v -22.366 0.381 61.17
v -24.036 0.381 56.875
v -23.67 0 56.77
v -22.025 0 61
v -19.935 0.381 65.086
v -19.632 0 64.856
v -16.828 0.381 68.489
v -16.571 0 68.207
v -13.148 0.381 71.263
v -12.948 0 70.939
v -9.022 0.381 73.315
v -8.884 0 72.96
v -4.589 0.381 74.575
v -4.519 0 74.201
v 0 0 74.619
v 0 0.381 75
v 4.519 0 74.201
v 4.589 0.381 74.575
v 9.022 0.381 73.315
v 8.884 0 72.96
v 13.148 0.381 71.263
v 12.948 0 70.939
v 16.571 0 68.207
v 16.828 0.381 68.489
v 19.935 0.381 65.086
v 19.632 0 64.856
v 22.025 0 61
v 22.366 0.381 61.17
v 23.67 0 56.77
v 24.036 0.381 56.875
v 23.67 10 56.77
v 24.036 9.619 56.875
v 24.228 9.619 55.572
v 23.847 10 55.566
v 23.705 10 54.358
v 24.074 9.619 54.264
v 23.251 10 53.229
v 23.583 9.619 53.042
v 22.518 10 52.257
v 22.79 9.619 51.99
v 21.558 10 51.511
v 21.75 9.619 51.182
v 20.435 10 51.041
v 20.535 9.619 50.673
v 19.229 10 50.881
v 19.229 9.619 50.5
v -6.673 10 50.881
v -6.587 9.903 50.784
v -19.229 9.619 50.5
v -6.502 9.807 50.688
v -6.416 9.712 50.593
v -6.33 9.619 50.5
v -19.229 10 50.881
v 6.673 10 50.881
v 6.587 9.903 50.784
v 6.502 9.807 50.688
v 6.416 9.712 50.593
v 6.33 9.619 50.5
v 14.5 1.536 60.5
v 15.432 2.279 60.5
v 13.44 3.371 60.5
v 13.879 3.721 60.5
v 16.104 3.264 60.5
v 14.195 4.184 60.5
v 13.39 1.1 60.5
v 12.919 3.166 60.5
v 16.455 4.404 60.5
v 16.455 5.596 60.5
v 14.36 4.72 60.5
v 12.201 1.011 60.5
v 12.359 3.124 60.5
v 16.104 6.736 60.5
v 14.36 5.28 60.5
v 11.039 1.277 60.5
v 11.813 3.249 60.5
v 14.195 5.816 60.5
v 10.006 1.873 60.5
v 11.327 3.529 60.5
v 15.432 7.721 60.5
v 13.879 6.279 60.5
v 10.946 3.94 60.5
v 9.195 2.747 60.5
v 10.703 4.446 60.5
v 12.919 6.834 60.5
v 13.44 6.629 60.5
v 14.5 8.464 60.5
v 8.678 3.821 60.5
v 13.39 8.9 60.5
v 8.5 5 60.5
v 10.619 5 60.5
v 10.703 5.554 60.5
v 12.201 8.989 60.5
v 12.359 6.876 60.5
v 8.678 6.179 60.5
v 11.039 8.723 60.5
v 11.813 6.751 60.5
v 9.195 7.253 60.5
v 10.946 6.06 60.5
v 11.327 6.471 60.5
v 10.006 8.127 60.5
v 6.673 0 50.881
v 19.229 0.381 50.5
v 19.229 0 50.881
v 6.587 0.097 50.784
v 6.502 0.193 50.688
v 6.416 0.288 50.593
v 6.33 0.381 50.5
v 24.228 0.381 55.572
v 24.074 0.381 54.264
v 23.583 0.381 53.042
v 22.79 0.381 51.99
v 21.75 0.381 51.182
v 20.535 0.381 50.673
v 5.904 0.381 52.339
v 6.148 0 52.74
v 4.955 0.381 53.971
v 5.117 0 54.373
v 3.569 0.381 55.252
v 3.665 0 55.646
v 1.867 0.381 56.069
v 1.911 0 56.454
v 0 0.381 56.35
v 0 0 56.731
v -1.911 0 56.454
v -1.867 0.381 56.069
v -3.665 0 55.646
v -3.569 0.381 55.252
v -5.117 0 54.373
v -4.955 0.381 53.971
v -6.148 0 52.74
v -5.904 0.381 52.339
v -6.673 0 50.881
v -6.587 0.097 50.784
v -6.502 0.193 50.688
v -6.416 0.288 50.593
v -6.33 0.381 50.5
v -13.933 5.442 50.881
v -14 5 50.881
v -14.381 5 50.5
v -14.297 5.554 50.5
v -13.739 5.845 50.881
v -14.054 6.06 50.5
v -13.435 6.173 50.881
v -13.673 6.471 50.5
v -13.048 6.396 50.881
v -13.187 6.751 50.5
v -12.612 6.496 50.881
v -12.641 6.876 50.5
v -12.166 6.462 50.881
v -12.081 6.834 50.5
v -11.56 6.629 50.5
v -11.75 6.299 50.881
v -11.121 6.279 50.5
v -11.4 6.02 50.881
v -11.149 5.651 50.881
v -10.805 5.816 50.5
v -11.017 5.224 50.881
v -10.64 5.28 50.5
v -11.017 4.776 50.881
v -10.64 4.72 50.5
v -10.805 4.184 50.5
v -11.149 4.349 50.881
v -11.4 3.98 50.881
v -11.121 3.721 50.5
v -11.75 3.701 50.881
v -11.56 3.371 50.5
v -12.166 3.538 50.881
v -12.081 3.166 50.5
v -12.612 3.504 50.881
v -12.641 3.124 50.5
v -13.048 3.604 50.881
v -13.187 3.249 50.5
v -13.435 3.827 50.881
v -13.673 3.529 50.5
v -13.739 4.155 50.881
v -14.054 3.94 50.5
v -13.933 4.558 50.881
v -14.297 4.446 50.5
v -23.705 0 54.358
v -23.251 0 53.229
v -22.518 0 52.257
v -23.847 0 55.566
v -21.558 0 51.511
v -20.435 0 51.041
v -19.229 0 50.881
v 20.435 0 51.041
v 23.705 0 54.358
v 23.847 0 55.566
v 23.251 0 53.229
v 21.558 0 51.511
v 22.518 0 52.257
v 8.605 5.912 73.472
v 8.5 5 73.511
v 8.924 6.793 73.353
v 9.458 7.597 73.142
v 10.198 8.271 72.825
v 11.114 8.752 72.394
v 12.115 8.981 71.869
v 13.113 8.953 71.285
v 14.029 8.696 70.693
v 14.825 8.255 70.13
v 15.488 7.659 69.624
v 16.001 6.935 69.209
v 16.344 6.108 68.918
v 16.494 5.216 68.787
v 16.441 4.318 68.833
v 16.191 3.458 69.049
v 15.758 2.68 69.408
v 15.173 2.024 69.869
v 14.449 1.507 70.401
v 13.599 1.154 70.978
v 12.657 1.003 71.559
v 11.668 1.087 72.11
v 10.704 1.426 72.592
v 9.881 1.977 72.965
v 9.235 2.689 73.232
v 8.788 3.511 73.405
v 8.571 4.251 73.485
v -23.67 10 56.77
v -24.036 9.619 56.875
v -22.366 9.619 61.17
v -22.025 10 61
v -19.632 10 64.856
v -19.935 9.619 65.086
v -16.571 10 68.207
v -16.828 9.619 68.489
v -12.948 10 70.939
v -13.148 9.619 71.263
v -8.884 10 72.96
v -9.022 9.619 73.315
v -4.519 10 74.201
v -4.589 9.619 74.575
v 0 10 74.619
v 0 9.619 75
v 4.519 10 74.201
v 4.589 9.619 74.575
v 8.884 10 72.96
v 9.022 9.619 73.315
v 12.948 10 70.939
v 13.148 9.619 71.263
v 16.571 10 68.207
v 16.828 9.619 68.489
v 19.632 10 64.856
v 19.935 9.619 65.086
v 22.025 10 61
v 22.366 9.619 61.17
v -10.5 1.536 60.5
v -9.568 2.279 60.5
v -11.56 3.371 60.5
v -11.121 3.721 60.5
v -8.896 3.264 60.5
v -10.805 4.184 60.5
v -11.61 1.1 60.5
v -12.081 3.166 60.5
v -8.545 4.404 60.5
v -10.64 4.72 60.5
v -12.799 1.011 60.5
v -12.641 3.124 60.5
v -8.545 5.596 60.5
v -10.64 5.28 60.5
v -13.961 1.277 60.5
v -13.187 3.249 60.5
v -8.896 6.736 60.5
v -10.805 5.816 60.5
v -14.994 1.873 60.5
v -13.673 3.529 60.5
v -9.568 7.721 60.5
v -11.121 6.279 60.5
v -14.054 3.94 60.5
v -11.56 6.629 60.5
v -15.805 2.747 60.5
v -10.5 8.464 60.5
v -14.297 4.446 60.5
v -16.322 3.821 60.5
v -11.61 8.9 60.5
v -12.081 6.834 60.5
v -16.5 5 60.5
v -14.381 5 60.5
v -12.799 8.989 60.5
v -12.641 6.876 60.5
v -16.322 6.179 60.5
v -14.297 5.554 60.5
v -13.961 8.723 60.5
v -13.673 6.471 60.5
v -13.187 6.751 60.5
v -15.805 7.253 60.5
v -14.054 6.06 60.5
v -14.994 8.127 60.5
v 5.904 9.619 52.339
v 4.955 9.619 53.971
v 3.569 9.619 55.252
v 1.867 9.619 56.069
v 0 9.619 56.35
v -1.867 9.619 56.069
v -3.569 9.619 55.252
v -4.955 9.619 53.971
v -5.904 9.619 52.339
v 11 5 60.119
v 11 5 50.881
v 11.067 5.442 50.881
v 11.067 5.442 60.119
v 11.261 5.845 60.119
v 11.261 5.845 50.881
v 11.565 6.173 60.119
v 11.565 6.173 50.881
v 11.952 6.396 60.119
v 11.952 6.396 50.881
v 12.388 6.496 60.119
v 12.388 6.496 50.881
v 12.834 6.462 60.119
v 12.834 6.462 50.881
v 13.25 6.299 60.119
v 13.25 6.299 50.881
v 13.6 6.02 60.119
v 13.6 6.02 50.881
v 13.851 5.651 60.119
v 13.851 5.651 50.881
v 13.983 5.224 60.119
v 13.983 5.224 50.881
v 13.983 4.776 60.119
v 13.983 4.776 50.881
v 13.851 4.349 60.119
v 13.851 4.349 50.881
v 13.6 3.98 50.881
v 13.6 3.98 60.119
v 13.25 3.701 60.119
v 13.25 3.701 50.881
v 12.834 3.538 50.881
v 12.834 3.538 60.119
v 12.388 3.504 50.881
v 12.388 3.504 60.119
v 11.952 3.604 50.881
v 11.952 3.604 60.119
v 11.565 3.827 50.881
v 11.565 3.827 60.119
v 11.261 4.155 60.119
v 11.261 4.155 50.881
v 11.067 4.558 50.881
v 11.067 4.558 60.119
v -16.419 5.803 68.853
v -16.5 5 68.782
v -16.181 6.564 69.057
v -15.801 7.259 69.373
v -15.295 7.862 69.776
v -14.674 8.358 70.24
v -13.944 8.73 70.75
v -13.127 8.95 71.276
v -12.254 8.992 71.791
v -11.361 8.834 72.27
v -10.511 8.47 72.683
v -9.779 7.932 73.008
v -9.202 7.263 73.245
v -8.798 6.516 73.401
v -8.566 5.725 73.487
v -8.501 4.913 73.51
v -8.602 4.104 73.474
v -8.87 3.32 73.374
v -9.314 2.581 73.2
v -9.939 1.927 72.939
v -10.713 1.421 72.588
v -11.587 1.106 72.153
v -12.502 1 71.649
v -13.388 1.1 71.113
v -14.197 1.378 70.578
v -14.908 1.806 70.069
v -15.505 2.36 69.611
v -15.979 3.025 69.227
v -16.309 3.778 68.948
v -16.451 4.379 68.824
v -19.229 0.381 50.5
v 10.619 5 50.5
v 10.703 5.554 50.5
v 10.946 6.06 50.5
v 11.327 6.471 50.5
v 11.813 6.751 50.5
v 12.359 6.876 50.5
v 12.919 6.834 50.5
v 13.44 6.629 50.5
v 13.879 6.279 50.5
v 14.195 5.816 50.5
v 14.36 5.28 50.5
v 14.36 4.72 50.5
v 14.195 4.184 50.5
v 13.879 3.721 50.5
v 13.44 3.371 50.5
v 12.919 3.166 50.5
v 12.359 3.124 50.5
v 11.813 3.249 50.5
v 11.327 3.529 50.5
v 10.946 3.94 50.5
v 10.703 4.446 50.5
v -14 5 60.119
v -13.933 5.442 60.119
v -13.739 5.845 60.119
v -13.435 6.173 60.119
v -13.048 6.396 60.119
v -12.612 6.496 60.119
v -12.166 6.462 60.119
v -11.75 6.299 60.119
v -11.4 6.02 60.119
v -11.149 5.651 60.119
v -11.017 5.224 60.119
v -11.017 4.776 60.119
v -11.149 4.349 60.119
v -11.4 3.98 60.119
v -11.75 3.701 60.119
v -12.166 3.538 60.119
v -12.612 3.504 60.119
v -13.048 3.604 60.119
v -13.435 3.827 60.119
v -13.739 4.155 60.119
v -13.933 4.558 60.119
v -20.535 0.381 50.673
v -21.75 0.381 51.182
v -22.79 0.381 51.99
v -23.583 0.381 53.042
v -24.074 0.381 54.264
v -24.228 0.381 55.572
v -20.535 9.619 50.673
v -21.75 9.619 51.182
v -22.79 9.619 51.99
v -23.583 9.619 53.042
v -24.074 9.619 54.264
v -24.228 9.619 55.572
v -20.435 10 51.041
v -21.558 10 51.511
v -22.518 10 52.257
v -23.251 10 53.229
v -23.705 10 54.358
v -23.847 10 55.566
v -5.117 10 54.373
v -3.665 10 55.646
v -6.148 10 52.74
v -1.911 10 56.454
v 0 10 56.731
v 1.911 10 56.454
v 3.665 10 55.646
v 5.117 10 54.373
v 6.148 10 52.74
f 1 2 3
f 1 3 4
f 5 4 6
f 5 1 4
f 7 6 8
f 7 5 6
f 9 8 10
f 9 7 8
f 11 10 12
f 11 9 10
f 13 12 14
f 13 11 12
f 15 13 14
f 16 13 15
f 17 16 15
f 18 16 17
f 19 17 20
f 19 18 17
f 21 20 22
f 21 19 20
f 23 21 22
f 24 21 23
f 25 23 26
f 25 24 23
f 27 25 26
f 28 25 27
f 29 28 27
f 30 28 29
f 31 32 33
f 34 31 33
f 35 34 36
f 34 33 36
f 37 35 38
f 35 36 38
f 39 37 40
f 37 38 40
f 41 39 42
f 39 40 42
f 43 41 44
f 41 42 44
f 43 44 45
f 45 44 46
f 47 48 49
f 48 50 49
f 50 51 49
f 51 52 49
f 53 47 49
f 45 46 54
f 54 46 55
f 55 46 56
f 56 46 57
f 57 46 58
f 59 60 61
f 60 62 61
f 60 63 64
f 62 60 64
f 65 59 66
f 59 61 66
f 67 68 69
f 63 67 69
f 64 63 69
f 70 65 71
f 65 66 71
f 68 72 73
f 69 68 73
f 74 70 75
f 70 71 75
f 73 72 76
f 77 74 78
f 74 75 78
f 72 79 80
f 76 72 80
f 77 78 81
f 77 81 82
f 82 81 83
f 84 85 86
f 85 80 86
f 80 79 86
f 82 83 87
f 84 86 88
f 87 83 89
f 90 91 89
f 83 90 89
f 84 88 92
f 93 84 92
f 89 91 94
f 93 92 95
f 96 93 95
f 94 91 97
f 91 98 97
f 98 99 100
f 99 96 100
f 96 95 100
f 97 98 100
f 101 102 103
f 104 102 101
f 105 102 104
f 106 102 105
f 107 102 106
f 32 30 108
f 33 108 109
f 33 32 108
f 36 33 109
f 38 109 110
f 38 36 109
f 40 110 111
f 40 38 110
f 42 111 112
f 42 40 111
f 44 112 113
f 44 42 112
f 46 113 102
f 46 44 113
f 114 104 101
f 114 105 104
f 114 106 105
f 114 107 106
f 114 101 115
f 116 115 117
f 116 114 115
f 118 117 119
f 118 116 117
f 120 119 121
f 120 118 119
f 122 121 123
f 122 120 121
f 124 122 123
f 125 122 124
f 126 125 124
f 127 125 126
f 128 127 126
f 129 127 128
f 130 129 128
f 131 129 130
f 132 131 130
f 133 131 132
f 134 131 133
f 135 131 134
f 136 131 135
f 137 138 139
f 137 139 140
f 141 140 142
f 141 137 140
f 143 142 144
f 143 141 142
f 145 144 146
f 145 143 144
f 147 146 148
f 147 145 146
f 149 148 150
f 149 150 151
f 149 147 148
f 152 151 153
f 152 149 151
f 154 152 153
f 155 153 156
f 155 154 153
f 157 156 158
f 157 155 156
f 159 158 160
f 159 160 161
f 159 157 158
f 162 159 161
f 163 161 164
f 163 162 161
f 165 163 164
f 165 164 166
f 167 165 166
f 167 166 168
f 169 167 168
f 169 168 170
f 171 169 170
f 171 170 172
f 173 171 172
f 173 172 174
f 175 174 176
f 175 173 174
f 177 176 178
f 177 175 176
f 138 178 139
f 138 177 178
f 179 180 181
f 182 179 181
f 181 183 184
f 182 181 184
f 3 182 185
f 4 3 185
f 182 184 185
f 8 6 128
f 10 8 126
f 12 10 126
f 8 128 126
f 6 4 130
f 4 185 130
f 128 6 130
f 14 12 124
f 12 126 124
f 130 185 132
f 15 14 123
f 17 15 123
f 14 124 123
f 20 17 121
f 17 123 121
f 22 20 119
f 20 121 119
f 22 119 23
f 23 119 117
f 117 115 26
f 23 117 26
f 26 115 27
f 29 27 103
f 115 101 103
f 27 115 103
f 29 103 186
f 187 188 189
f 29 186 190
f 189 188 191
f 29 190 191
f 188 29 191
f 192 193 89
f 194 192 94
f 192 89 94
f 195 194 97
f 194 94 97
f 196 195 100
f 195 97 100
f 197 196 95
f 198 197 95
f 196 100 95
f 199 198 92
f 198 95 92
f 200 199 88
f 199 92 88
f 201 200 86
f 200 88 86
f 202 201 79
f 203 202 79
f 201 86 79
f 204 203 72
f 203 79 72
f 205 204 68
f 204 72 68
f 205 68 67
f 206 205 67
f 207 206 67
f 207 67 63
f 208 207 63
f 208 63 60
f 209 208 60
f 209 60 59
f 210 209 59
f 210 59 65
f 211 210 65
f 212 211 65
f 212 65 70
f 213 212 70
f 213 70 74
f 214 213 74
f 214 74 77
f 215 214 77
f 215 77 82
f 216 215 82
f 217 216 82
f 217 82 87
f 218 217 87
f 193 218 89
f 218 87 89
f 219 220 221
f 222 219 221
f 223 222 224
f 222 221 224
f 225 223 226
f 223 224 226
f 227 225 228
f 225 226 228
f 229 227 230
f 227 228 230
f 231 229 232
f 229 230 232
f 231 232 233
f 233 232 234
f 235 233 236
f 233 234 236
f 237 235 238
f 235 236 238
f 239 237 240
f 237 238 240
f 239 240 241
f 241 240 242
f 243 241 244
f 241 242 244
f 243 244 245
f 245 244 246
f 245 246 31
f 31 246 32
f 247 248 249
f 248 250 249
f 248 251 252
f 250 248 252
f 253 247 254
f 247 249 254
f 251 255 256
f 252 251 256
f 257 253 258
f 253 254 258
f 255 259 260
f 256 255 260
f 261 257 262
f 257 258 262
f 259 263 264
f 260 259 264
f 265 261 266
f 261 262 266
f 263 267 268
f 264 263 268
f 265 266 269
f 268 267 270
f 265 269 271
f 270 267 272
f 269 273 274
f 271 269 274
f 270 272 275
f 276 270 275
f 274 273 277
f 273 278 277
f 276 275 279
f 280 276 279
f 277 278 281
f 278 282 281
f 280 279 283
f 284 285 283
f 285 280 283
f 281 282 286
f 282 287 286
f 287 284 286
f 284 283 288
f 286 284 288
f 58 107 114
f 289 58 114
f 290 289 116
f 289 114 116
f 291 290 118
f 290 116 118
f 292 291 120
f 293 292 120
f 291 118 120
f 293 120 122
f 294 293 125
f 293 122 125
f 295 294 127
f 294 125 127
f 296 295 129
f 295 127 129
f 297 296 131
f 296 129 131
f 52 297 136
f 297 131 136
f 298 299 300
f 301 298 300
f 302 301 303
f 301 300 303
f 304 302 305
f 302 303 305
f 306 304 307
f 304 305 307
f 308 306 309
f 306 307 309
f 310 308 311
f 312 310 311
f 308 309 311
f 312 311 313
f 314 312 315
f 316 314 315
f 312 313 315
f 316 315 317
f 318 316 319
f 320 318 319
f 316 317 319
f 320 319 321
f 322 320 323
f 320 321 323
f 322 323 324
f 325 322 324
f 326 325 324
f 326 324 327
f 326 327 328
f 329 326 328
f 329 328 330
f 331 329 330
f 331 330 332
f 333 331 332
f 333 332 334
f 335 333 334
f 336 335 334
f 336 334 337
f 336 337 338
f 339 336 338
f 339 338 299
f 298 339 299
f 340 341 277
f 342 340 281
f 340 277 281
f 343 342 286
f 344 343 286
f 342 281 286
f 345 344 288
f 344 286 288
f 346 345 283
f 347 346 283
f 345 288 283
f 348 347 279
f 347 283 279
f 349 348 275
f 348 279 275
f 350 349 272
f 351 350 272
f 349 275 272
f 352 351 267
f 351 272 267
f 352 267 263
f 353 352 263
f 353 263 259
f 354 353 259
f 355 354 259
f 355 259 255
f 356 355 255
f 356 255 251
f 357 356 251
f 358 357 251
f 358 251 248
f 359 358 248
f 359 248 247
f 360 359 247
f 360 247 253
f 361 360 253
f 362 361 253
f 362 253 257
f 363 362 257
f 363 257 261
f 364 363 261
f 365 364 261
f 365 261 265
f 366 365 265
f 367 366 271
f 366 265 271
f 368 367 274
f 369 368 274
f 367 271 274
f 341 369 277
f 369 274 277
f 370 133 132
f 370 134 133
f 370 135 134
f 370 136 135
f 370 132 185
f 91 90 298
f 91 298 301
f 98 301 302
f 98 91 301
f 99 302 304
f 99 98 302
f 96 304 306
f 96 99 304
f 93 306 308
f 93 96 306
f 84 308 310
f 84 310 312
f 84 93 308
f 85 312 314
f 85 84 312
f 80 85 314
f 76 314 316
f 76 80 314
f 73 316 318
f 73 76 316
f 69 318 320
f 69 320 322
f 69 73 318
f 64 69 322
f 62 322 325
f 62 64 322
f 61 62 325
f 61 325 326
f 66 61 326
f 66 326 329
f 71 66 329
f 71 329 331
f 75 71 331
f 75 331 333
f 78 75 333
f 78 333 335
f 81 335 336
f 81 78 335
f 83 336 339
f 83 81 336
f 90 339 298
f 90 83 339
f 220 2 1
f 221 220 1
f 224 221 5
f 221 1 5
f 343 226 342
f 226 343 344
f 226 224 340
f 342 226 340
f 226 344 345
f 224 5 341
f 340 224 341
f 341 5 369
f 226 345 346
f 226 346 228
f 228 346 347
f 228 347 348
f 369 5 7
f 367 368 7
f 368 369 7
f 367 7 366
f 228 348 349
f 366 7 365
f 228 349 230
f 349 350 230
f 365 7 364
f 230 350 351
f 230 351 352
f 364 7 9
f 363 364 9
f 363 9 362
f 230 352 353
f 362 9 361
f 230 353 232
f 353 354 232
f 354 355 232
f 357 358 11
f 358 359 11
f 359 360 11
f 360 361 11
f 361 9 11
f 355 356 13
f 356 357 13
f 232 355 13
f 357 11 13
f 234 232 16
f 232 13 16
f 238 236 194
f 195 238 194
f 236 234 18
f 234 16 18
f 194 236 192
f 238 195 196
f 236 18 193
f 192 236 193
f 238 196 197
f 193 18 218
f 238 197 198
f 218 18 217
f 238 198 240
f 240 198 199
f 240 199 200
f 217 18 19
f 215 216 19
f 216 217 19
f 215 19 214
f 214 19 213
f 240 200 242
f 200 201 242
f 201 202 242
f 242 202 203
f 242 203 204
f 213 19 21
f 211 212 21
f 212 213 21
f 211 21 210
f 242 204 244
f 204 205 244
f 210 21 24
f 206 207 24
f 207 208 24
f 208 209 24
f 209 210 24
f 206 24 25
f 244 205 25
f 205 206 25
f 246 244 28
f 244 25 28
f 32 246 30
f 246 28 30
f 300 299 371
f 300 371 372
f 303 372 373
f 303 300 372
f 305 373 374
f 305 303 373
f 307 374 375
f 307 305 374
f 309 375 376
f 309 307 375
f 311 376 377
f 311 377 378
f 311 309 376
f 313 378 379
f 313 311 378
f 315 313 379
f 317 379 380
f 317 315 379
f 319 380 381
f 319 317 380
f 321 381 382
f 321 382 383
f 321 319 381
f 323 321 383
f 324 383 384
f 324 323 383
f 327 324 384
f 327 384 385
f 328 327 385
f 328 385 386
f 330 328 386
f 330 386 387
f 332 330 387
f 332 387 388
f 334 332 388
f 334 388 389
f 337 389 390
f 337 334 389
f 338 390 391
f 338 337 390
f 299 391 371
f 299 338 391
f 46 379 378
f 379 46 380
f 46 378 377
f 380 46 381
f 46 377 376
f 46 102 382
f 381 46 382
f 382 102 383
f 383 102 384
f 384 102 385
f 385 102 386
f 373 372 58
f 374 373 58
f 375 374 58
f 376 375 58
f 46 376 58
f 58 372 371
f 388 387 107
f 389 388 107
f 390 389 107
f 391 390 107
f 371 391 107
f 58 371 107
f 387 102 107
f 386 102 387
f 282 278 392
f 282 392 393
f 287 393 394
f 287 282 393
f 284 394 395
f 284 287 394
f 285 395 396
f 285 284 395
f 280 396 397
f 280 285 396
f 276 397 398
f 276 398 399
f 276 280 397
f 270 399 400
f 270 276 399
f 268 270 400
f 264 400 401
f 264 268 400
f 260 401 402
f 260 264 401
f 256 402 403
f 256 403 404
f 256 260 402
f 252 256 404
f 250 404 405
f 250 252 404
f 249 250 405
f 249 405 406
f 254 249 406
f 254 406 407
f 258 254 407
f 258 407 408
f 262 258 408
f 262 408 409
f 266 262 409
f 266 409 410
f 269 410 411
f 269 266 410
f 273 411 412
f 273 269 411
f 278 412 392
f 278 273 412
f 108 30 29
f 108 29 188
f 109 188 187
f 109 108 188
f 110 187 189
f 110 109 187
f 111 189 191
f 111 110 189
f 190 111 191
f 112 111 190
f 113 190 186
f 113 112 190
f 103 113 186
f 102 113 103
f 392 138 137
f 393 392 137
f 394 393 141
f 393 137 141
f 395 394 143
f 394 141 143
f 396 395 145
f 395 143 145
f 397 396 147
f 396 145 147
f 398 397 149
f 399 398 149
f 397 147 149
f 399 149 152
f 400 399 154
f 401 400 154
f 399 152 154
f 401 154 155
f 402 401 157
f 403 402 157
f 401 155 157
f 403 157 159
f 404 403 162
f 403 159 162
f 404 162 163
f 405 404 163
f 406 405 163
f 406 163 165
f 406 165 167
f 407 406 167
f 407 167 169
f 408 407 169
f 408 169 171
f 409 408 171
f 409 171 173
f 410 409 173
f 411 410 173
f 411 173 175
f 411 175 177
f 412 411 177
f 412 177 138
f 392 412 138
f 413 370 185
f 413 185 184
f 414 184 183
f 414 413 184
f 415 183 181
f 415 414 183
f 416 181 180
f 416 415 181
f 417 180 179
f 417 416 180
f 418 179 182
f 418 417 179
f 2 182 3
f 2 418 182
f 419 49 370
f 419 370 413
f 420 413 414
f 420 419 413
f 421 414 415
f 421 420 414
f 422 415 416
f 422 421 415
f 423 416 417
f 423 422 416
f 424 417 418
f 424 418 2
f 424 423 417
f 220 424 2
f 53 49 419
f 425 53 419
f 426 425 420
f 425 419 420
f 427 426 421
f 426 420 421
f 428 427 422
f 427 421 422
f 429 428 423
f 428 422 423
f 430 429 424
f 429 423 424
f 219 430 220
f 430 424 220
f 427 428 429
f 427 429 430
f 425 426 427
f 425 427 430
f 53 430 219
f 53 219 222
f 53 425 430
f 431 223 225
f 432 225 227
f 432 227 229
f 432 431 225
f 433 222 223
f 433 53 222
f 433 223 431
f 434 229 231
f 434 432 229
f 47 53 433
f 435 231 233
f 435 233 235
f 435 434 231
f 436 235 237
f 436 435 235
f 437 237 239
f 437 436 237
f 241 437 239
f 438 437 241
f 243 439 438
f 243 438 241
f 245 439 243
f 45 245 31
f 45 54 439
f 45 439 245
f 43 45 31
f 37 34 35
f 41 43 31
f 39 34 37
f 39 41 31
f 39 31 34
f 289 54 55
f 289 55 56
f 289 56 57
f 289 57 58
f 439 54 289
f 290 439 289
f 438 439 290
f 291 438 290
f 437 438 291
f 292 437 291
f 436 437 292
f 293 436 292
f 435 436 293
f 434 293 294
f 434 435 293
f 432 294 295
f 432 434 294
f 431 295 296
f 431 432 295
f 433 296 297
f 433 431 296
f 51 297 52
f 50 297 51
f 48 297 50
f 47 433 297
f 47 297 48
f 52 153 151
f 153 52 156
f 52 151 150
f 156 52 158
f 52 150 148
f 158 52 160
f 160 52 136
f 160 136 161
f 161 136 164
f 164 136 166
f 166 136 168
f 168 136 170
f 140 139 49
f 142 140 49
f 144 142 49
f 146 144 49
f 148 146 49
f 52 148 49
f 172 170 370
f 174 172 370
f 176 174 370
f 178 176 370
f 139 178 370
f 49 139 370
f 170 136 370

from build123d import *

# Parameters (mm, degrees)
BOSS_EXTRUDE1_DEPTH = 10
FILLET1_R           = 5
SKETCH2_R           = 1.5
CUT_EXTRUDE1_DEPTH  = 36.878807745
CUT_EXTRUDE2_START  = -10
SKETCH2_3_R         = 4
SKETCH2_3_R_2       = 1.5
CUT_EXTRUDE2_DEPTH  = 26.878807842
CHAMFER1_SIZE       = 0.381


with BuildPart() as part:
    # Sketch1 → Boss-Extrude1 (new body)
    with BuildSketch(Plane(origin=(0, 0, 0), x_dir=(1, 0, 0), z_dir=(0, 1, 0))):
        with BuildLine():
            Line((-6.330284354, -50.5), (-24.9949995, -50.5))
            ThreePointArc((-24.9949995, -50.5), (0, -75), (24.9949995, -50.5))
            Line((24.9949995, -50.5), (6.330284354, -50.5))
            ThreePointArc((6.330284354, -50.5), (0, -56.35), (-6.330284354, -50.5))
        make_face()
    extrude(amount=BOSS_EXTRUDE1_DEPTH)

    # Fillet1
    fillet1_edges = [part.edges().sort_by_distance(p)[0] for p in [
        (24.9949995, 5, 50.5),
        (-24.9949995, 5, 50.5),
    ]]
    fillet(fillet1_edges, radius=FILLET1_R)

    # Sketch2 → Cut-Extrude1 (cut, through all)
    with BuildSketch(Plane(origin=(0, 0, 50.5), x_dir=(-1, 0, 0), z_dir=(0, 0, -1))):
        with Locations((-12.5, 5)):
            Circle(SKETCH2_R)
        with Locations((12.5, 5)):
            Circle(SKETCH2_R)
    extrude(amount=-CUT_EXTRUDE1_DEPTH, mode=Mode.SUBTRACT)

    # Sketch2<3> → Cut-Extrude2 (cut, through all)
    # profile 1 of 2: a face of its own
    with BuildSketch(Plane(origin=(0, 0, 50.5), x_dir=(-1, 0, 0), z_dir=(0, 0, -1)).offset(CUT_EXTRUDE2_START)):
        with Locations((-12.5, 5)):
            Circle(SKETCH2_3_R)
        with Locations((-12.5, 5)):
            Circle(SKETCH2_3_R_2, mode=Mode.SUBTRACT)
    # profile 2 of 2: a face of its own
    with BuildSketch(Plane(origin=(0, 0, 50.5), x_dir=(-1, 0, 0), z_dir=(0, 0, -1)).offset(CUT_EXTRUDE2_START)):
        with Locations((12.5, 5)):
            Circle(SKETCH2_3_R)
        with Locations((12.5, 5)):
            Circle(SKETCH2_3_R_2, mode=Mode.SUBTRACT)
    extrude(amount=-CUT_EXTRUDE2_DEPTH, mode=Mode.SUBTRACT)

    # Chamfer1
    chamfer1_edges = [part.edges().sort_by_distance(p)[0] for p in [
        (0, 0, 75),
        (12.779584438, 10, 50.5),
        (0, 10, 75),
        (-12.779584438, 0, 50.5),
        (23.221064379, 0, 52.489601355),
        (0, 10, 56.35),
        (-23.221064379, 0, 52.489601355),
        (-12.779584438, 10, 50.5),
        (23.221064379, 10, 52.489601355),
        (-23.221064379, 10, 52.489601355),
        (14, 5, 50.5),
        (-11, 5, 50.5),
        (14, 5, 60.5),
        (-11, 5, 60.5),
        (0, 0, 56.35),
        (12.779584438, 0, 50.5),
    ]]
    chamfer(chamfer1_edges, length=CHAMFER1_SIZE)


solid = part.part
